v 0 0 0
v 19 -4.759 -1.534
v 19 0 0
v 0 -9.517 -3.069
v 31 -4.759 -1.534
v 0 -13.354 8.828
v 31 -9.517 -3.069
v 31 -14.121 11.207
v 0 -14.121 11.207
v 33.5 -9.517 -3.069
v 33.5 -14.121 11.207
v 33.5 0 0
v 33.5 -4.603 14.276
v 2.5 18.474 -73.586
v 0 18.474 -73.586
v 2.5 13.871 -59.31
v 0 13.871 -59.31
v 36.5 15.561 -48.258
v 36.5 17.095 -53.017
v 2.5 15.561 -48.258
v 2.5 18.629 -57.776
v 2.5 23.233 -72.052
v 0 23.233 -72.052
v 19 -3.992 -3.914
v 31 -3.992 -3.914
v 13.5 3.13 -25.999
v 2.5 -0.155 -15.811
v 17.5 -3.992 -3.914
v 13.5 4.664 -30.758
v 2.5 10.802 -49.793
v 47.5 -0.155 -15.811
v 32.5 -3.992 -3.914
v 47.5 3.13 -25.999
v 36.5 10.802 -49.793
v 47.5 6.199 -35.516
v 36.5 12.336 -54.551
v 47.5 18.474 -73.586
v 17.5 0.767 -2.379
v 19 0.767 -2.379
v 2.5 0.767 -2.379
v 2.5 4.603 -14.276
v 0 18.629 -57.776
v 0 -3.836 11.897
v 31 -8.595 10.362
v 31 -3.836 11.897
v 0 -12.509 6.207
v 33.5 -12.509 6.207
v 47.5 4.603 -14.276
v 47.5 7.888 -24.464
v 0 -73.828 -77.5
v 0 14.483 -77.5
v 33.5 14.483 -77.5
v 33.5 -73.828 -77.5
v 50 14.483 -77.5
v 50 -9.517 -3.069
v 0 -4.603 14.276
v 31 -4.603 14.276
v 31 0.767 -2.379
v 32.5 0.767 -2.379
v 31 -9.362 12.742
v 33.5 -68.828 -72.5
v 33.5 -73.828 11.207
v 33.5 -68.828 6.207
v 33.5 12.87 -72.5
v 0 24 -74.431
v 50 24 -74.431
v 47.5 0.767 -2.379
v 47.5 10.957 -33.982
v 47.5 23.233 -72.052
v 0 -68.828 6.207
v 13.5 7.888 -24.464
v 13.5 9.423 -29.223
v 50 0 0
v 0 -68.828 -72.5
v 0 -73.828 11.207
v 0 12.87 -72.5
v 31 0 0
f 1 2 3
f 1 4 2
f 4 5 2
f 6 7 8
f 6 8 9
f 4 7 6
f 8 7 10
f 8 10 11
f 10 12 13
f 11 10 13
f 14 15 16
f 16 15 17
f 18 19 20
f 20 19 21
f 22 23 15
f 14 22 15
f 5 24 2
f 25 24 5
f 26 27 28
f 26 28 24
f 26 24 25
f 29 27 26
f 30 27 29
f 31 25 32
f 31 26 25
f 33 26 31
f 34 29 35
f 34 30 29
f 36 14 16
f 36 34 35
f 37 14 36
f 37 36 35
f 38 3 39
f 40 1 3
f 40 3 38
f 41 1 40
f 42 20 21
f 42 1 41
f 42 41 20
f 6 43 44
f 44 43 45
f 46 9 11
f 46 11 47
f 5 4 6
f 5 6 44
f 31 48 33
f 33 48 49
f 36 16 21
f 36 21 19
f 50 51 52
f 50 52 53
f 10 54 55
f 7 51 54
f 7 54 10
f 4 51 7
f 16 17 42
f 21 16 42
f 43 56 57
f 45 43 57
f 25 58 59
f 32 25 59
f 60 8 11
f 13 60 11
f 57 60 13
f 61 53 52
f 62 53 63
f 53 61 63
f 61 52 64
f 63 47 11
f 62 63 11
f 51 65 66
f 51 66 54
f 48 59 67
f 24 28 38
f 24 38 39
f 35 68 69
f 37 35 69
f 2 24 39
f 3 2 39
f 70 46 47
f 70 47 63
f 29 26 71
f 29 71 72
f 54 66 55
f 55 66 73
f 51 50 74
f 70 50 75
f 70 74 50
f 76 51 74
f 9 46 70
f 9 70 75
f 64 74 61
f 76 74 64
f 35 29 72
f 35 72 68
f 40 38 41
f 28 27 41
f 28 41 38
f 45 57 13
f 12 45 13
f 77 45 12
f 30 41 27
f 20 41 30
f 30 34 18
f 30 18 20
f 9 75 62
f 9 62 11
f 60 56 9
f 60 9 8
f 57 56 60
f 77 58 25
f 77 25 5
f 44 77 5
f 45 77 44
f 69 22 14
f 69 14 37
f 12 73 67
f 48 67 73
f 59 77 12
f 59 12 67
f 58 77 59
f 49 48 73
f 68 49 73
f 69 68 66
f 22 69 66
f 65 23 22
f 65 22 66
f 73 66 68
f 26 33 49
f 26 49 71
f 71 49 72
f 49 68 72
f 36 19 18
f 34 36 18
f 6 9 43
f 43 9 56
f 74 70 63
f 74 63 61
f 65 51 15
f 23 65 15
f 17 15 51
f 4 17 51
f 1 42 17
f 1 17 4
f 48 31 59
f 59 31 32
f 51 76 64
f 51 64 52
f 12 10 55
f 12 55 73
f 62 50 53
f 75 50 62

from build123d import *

# Parameters (mm, degrees)
EXTRUDE_1_DEPTH     = 50
SKETCH_2_W          = 45
SKETCH_2_H          = 73.20482035
CUT_EXTRUDE_1_DEPTH = 5
EXTRUDE_3_DEPTH     = 5
CUT_EXTRUDE_2_REACH = 95.182
SKETCH_9_W          = 12
SKETCH_9_H          = 5
EXTRUDE_4_DEPTH     = 15
SKETCH_13_W         = 31
SKETCH_13_H         = 10
EXTRUDE_5_DEPTH     = 2.5
EXTRUDE_6_DEPTH     = 2.5
CUT_EXTRUDE_3_REACH = 97.301
EXTRUDE_1_2_DEPTH   = 5
EXTRUDE_2_DEPTH     = 33.5


with BuildPart() as part:
    # Sketch 1 → Extrude 1 (new body)
    with BuildSketch(Plane(origin=(0, 0, 0), x_dir=(0, 0, -1), z_dir=(1, 0, 0))):
        Polygon((0, 0), (74.43113546, 24), (77.5, 14.482538656), (3.06886454, -9.517461344), align=None)
    extrude(amount=EXTRUDE_1_DEPTH)

    # Sketch 2 → 除料-伸長1 (cut)
    with BuildSketch(Plane(origin=(0, 0, 0), x_dir=(1, 0, 0), z_dir=(0, 0.951746134414701, 0.30688645396412334))):
        with Locations((25, 39.102410175)):
            Rectangle(SKETCH_2_W, SKETCH_2_H)
    extrude(amount=-CUT_EXTRUDE_1_DEPTH, mode=Mode.SUBTRACT)

    # 草圖7 → 填料-伸長3 (add)
    with BuildSketch(Plane(origin=(0, -4.758730672, -1.53443227), x_dir=(1, 0, 0), z_dir=(0, 0.951746134414701, 0.30688645396412323))):
        Polygon((2.5, 15), (17.5, 2.5), (2.5, 2.5), align=None)
        Polygon((47.5, 2.5), (47.5, 15), (32.5, 2.5), align=None)
    extrude(amount=EXTRUDE_3_DEPTH)

    # 草圖9 → 除料-伸長2 (cut, up to next)
    with BuildSketch(Plane(origin=(0, 0.767216135, -2.379365336), x_dir=(-1, 0, 0), z_dir=(0, 0.30688645396412334, -0.951746134414701)), mode=Mode.PRIVATE) as cut_extrude_2_sk1:
        with Locations((-25, -2.5)):
            Rectangle(SKETCH_9_W, SKETCH_9_H)
    cut_extrude_2_tool1 = extrude(cut_extrude_2_sk1.sketch, amount=-CUT_EXTRUDE_2_REACH, mode=Mode.PRIVATE) & part.part
    add(cut_extrude_2_tool1.solids().sort_by_distance((25, -1.612149, -3.146581))[0], mode=Mode.SUBTRACT)

    # 草圖11 → 填料-伸長4 (add)
    with BuildSketch(Plane(origin=(0, 0, 0), x_dir=(1, 0, 0), z_dir=(0, -0.3068864539641233, 0.951746134414701))):
        Polygon((0, -10), (31, -5), (31, -10), align=None)
    extrude(amount=EXTRUDE_4_DEPTH)

    # 草圖13 → 填料-伸長5 (add)
    with BuildSketch(Plane(origin=(0, -4.603296809, 14.276192016), x_dir=(1, 0, 0), z_dir=(0, -0.3068864539641233, 0.951746134414701))):
        with Locations((15.5, -5)):
            Rectangle(SKETCH_13_W, SKETCH_13_H)
    extrude(amount=-EXTRUDE_5_DEPTH)

    # 草圖14 → 填料-伸長6 (add)
    with BuildSketch(Plane(origin=(31, 0, 0), x_dir=(0, 0, -1), z_dir=(1, 0, 0))):
        Polygon((-14.276192016, -4.603296809), (0, 0), (3.06886454, -9.517461344), (-11.207327477, -14.120758154), align=None)
    extrude(amount=EXTRUDE_6_DEPTH)

    # 草圖15 → 除料-伸長3 (cut, up to next)
    with BuildSketch(Plane.ZY, mode=Mode.PRIVATE) as cut_extrude_3_sk1:
        Polygon((-72.051770124, 23.232783865), (-73.586202394, 18.474053193), (-59.310010378, 13.870756384), (-57.775578108, 18.629487056), align=None)
    cut_extrude_3_tool1 = extrude(cut_extrude_3_sk1.sketch, amount=-CUT_EXTRUDE_3_REACH, mode=Mode.PRIVATE) & part.part
    add(cut_extrude_3_tool1.solids().sort_by_distance((0, 18.55177, -65.68089))[0], mode=Mode.SUBTRACT)

    # Sketch 1 2 → Extrude 1 2 (add)
    with BuildSketch(Plane(origin=(0, -4.758730672, -1.53443227), x_dir=(1, 0, 0), z_dir=(0, 0.951746134414701, 0.30688645396412323))):
        Polygon((2.5, 60.70482035), (36.5, 55.70482035), (36.5, 50.70482035), (2.5, 50.70482035), align=None)
        Polygon((47.5, 25.70482035), (13.5, 25.70482035), (13.5, 30.70482035), (47.5, 35.70482035), align=None)
    extrude(amount=EXTRUDE_1_2_DEPTH)


with BuildPart() as body_2:
    # Sketch 2 2 → Extrude 2 (new body)
    with BuildSketch(Plane.ZY):
        Polygon((-77.5, 14.482538656), (-77.5, -73.827595212), (11.207327477, -73.827595212), (11.207327477, -14.120758154), (6.207327477, -12.508529625), (6.207327477, -68.827595212), (-72.5, -68.827595212), (-72.5, 12.870310127), align=None)
    extrude(amount=-EXTRUDE_2_DEPTH)


solid = Compound([part.part, body_2.part])
